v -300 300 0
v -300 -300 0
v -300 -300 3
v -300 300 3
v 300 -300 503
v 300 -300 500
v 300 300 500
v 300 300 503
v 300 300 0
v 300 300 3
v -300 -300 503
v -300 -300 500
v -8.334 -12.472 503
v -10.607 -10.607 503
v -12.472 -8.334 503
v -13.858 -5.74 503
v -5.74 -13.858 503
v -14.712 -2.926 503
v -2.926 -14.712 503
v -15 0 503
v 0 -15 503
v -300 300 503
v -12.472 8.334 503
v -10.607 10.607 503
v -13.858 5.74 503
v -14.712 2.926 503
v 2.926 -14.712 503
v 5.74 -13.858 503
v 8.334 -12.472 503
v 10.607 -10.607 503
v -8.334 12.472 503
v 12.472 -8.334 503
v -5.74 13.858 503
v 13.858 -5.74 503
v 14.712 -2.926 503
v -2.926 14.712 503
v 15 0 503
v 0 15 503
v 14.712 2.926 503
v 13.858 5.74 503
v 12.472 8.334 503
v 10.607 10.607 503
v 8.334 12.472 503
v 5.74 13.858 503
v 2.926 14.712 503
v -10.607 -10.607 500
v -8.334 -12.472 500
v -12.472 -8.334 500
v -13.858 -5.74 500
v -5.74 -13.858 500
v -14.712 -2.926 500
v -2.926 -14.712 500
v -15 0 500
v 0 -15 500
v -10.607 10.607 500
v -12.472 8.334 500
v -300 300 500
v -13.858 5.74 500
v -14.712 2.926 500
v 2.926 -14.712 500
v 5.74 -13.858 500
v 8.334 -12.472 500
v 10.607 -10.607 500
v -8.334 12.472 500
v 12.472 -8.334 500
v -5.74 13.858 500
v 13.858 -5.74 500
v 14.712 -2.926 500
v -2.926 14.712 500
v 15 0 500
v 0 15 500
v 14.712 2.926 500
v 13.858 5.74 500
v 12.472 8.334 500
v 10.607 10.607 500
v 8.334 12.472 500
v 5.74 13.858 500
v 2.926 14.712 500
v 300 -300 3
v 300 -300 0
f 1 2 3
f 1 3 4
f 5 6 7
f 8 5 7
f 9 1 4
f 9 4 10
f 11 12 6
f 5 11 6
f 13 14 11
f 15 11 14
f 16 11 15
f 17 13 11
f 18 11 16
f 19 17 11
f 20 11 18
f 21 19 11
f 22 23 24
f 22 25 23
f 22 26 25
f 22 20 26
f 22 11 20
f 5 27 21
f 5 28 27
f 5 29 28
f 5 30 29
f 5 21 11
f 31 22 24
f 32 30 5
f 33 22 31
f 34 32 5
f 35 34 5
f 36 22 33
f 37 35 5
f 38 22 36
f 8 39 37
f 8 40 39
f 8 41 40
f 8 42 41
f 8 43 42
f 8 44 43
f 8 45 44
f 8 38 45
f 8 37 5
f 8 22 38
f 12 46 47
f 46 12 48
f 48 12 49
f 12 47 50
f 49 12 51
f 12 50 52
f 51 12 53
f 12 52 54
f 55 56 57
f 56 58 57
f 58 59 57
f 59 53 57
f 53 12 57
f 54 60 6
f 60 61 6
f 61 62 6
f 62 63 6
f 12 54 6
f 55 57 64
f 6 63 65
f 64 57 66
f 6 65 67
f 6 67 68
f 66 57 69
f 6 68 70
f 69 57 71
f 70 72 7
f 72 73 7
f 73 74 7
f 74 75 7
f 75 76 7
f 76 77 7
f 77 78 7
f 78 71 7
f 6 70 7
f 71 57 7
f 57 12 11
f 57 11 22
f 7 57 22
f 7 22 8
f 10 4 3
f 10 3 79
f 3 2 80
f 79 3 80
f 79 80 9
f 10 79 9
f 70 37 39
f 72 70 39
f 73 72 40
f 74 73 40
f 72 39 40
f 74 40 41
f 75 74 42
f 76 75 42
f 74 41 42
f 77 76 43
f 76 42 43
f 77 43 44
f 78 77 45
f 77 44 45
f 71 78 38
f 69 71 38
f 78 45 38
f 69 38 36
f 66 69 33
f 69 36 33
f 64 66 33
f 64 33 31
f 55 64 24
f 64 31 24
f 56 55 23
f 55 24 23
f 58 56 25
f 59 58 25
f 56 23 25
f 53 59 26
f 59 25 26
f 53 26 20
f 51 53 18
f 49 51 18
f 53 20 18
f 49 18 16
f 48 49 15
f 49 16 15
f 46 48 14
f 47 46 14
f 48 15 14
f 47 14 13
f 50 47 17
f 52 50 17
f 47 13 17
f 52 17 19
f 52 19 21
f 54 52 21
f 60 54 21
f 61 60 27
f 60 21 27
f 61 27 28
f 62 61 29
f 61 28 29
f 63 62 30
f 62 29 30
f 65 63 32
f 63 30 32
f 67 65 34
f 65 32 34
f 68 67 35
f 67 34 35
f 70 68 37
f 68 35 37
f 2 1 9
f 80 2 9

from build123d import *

# Parameters (mm, degrees)
F0_W      = 600
F0_H      = 600
F1_DEPTH  = 3
F3_R      = 15
F3_W      = 603
F3_H      = 603
F3_R_2    = 51.9341376396
F4_DEPTH  = 3
F10_DEPTH = 3
F11_W     = 603
F11_H     = 603
F12_DEPTH = 3


with BuildPart() as f1:
    # F0 (on Top) → F1 (new body)
    with BuildSketch(Plane.XY):
        Rectangle(F0_W, F0_H)
    extrude(amount=F1_DEPTH)


with BuildPart() as f2_1:
    # F2: copy of F1
    add(f1.part.moved(Location((0, 0, 500))))

    # F3 (on face) → F4 (cut, through all)
    with BuildSketch(Plane.XY.offset(503)):
        Circle(F3_R)
        with Locations((787.125565052, -26.1663422585)):
            Rectangle(F3_W, F3_H)
        with Locations((775.917828083, 0)):
            Circle(F3_R_2, mode=Mode.SUBTRACT)
    extrude(amount=-F4_DEPTH, mode=Mode.SUBTRACT)


with BuildPart() as f5_1:
    # F5: copy of F1
    add(f1.part.moved(Location((0, 0, 250))))


with BuildPart() as f6_1:
    # F6: copy of F1
    add(f1.part.moved(Location((0, 0, -250))))


with BuildPart() as f8_1:
    # F8: copy of F6_1
    add(f6_1.part.moved(Location((0, 0, -500))))

    # F9 (on face) → F10 (cut, through all)
    with BuildSketch(Plane.XY.offset(-747)):
        with BuildLine():
            Line((300, -220), (300, -160.0022337274))
            ThreePointArc((300, -160.0022337274), (270.2588640055, -190.0011168637), (300, -220))
        make_face()
    extrude(amount=-F10_DEPTH, mode=Mode.SUBTRACT)


with BuildPart() as f12:
    # F11 (on Top) → F12 (new body)
    with BuildSketch(Plane.XY):
        Rectangle(F11_W, F11_H)
    extrude(amount=F12_DEPTH)


with BuildPart() as f15_1:
    # F15: copy of F12
    add(f12.part)


solid = Compound([f1.part, f2_1.part])
